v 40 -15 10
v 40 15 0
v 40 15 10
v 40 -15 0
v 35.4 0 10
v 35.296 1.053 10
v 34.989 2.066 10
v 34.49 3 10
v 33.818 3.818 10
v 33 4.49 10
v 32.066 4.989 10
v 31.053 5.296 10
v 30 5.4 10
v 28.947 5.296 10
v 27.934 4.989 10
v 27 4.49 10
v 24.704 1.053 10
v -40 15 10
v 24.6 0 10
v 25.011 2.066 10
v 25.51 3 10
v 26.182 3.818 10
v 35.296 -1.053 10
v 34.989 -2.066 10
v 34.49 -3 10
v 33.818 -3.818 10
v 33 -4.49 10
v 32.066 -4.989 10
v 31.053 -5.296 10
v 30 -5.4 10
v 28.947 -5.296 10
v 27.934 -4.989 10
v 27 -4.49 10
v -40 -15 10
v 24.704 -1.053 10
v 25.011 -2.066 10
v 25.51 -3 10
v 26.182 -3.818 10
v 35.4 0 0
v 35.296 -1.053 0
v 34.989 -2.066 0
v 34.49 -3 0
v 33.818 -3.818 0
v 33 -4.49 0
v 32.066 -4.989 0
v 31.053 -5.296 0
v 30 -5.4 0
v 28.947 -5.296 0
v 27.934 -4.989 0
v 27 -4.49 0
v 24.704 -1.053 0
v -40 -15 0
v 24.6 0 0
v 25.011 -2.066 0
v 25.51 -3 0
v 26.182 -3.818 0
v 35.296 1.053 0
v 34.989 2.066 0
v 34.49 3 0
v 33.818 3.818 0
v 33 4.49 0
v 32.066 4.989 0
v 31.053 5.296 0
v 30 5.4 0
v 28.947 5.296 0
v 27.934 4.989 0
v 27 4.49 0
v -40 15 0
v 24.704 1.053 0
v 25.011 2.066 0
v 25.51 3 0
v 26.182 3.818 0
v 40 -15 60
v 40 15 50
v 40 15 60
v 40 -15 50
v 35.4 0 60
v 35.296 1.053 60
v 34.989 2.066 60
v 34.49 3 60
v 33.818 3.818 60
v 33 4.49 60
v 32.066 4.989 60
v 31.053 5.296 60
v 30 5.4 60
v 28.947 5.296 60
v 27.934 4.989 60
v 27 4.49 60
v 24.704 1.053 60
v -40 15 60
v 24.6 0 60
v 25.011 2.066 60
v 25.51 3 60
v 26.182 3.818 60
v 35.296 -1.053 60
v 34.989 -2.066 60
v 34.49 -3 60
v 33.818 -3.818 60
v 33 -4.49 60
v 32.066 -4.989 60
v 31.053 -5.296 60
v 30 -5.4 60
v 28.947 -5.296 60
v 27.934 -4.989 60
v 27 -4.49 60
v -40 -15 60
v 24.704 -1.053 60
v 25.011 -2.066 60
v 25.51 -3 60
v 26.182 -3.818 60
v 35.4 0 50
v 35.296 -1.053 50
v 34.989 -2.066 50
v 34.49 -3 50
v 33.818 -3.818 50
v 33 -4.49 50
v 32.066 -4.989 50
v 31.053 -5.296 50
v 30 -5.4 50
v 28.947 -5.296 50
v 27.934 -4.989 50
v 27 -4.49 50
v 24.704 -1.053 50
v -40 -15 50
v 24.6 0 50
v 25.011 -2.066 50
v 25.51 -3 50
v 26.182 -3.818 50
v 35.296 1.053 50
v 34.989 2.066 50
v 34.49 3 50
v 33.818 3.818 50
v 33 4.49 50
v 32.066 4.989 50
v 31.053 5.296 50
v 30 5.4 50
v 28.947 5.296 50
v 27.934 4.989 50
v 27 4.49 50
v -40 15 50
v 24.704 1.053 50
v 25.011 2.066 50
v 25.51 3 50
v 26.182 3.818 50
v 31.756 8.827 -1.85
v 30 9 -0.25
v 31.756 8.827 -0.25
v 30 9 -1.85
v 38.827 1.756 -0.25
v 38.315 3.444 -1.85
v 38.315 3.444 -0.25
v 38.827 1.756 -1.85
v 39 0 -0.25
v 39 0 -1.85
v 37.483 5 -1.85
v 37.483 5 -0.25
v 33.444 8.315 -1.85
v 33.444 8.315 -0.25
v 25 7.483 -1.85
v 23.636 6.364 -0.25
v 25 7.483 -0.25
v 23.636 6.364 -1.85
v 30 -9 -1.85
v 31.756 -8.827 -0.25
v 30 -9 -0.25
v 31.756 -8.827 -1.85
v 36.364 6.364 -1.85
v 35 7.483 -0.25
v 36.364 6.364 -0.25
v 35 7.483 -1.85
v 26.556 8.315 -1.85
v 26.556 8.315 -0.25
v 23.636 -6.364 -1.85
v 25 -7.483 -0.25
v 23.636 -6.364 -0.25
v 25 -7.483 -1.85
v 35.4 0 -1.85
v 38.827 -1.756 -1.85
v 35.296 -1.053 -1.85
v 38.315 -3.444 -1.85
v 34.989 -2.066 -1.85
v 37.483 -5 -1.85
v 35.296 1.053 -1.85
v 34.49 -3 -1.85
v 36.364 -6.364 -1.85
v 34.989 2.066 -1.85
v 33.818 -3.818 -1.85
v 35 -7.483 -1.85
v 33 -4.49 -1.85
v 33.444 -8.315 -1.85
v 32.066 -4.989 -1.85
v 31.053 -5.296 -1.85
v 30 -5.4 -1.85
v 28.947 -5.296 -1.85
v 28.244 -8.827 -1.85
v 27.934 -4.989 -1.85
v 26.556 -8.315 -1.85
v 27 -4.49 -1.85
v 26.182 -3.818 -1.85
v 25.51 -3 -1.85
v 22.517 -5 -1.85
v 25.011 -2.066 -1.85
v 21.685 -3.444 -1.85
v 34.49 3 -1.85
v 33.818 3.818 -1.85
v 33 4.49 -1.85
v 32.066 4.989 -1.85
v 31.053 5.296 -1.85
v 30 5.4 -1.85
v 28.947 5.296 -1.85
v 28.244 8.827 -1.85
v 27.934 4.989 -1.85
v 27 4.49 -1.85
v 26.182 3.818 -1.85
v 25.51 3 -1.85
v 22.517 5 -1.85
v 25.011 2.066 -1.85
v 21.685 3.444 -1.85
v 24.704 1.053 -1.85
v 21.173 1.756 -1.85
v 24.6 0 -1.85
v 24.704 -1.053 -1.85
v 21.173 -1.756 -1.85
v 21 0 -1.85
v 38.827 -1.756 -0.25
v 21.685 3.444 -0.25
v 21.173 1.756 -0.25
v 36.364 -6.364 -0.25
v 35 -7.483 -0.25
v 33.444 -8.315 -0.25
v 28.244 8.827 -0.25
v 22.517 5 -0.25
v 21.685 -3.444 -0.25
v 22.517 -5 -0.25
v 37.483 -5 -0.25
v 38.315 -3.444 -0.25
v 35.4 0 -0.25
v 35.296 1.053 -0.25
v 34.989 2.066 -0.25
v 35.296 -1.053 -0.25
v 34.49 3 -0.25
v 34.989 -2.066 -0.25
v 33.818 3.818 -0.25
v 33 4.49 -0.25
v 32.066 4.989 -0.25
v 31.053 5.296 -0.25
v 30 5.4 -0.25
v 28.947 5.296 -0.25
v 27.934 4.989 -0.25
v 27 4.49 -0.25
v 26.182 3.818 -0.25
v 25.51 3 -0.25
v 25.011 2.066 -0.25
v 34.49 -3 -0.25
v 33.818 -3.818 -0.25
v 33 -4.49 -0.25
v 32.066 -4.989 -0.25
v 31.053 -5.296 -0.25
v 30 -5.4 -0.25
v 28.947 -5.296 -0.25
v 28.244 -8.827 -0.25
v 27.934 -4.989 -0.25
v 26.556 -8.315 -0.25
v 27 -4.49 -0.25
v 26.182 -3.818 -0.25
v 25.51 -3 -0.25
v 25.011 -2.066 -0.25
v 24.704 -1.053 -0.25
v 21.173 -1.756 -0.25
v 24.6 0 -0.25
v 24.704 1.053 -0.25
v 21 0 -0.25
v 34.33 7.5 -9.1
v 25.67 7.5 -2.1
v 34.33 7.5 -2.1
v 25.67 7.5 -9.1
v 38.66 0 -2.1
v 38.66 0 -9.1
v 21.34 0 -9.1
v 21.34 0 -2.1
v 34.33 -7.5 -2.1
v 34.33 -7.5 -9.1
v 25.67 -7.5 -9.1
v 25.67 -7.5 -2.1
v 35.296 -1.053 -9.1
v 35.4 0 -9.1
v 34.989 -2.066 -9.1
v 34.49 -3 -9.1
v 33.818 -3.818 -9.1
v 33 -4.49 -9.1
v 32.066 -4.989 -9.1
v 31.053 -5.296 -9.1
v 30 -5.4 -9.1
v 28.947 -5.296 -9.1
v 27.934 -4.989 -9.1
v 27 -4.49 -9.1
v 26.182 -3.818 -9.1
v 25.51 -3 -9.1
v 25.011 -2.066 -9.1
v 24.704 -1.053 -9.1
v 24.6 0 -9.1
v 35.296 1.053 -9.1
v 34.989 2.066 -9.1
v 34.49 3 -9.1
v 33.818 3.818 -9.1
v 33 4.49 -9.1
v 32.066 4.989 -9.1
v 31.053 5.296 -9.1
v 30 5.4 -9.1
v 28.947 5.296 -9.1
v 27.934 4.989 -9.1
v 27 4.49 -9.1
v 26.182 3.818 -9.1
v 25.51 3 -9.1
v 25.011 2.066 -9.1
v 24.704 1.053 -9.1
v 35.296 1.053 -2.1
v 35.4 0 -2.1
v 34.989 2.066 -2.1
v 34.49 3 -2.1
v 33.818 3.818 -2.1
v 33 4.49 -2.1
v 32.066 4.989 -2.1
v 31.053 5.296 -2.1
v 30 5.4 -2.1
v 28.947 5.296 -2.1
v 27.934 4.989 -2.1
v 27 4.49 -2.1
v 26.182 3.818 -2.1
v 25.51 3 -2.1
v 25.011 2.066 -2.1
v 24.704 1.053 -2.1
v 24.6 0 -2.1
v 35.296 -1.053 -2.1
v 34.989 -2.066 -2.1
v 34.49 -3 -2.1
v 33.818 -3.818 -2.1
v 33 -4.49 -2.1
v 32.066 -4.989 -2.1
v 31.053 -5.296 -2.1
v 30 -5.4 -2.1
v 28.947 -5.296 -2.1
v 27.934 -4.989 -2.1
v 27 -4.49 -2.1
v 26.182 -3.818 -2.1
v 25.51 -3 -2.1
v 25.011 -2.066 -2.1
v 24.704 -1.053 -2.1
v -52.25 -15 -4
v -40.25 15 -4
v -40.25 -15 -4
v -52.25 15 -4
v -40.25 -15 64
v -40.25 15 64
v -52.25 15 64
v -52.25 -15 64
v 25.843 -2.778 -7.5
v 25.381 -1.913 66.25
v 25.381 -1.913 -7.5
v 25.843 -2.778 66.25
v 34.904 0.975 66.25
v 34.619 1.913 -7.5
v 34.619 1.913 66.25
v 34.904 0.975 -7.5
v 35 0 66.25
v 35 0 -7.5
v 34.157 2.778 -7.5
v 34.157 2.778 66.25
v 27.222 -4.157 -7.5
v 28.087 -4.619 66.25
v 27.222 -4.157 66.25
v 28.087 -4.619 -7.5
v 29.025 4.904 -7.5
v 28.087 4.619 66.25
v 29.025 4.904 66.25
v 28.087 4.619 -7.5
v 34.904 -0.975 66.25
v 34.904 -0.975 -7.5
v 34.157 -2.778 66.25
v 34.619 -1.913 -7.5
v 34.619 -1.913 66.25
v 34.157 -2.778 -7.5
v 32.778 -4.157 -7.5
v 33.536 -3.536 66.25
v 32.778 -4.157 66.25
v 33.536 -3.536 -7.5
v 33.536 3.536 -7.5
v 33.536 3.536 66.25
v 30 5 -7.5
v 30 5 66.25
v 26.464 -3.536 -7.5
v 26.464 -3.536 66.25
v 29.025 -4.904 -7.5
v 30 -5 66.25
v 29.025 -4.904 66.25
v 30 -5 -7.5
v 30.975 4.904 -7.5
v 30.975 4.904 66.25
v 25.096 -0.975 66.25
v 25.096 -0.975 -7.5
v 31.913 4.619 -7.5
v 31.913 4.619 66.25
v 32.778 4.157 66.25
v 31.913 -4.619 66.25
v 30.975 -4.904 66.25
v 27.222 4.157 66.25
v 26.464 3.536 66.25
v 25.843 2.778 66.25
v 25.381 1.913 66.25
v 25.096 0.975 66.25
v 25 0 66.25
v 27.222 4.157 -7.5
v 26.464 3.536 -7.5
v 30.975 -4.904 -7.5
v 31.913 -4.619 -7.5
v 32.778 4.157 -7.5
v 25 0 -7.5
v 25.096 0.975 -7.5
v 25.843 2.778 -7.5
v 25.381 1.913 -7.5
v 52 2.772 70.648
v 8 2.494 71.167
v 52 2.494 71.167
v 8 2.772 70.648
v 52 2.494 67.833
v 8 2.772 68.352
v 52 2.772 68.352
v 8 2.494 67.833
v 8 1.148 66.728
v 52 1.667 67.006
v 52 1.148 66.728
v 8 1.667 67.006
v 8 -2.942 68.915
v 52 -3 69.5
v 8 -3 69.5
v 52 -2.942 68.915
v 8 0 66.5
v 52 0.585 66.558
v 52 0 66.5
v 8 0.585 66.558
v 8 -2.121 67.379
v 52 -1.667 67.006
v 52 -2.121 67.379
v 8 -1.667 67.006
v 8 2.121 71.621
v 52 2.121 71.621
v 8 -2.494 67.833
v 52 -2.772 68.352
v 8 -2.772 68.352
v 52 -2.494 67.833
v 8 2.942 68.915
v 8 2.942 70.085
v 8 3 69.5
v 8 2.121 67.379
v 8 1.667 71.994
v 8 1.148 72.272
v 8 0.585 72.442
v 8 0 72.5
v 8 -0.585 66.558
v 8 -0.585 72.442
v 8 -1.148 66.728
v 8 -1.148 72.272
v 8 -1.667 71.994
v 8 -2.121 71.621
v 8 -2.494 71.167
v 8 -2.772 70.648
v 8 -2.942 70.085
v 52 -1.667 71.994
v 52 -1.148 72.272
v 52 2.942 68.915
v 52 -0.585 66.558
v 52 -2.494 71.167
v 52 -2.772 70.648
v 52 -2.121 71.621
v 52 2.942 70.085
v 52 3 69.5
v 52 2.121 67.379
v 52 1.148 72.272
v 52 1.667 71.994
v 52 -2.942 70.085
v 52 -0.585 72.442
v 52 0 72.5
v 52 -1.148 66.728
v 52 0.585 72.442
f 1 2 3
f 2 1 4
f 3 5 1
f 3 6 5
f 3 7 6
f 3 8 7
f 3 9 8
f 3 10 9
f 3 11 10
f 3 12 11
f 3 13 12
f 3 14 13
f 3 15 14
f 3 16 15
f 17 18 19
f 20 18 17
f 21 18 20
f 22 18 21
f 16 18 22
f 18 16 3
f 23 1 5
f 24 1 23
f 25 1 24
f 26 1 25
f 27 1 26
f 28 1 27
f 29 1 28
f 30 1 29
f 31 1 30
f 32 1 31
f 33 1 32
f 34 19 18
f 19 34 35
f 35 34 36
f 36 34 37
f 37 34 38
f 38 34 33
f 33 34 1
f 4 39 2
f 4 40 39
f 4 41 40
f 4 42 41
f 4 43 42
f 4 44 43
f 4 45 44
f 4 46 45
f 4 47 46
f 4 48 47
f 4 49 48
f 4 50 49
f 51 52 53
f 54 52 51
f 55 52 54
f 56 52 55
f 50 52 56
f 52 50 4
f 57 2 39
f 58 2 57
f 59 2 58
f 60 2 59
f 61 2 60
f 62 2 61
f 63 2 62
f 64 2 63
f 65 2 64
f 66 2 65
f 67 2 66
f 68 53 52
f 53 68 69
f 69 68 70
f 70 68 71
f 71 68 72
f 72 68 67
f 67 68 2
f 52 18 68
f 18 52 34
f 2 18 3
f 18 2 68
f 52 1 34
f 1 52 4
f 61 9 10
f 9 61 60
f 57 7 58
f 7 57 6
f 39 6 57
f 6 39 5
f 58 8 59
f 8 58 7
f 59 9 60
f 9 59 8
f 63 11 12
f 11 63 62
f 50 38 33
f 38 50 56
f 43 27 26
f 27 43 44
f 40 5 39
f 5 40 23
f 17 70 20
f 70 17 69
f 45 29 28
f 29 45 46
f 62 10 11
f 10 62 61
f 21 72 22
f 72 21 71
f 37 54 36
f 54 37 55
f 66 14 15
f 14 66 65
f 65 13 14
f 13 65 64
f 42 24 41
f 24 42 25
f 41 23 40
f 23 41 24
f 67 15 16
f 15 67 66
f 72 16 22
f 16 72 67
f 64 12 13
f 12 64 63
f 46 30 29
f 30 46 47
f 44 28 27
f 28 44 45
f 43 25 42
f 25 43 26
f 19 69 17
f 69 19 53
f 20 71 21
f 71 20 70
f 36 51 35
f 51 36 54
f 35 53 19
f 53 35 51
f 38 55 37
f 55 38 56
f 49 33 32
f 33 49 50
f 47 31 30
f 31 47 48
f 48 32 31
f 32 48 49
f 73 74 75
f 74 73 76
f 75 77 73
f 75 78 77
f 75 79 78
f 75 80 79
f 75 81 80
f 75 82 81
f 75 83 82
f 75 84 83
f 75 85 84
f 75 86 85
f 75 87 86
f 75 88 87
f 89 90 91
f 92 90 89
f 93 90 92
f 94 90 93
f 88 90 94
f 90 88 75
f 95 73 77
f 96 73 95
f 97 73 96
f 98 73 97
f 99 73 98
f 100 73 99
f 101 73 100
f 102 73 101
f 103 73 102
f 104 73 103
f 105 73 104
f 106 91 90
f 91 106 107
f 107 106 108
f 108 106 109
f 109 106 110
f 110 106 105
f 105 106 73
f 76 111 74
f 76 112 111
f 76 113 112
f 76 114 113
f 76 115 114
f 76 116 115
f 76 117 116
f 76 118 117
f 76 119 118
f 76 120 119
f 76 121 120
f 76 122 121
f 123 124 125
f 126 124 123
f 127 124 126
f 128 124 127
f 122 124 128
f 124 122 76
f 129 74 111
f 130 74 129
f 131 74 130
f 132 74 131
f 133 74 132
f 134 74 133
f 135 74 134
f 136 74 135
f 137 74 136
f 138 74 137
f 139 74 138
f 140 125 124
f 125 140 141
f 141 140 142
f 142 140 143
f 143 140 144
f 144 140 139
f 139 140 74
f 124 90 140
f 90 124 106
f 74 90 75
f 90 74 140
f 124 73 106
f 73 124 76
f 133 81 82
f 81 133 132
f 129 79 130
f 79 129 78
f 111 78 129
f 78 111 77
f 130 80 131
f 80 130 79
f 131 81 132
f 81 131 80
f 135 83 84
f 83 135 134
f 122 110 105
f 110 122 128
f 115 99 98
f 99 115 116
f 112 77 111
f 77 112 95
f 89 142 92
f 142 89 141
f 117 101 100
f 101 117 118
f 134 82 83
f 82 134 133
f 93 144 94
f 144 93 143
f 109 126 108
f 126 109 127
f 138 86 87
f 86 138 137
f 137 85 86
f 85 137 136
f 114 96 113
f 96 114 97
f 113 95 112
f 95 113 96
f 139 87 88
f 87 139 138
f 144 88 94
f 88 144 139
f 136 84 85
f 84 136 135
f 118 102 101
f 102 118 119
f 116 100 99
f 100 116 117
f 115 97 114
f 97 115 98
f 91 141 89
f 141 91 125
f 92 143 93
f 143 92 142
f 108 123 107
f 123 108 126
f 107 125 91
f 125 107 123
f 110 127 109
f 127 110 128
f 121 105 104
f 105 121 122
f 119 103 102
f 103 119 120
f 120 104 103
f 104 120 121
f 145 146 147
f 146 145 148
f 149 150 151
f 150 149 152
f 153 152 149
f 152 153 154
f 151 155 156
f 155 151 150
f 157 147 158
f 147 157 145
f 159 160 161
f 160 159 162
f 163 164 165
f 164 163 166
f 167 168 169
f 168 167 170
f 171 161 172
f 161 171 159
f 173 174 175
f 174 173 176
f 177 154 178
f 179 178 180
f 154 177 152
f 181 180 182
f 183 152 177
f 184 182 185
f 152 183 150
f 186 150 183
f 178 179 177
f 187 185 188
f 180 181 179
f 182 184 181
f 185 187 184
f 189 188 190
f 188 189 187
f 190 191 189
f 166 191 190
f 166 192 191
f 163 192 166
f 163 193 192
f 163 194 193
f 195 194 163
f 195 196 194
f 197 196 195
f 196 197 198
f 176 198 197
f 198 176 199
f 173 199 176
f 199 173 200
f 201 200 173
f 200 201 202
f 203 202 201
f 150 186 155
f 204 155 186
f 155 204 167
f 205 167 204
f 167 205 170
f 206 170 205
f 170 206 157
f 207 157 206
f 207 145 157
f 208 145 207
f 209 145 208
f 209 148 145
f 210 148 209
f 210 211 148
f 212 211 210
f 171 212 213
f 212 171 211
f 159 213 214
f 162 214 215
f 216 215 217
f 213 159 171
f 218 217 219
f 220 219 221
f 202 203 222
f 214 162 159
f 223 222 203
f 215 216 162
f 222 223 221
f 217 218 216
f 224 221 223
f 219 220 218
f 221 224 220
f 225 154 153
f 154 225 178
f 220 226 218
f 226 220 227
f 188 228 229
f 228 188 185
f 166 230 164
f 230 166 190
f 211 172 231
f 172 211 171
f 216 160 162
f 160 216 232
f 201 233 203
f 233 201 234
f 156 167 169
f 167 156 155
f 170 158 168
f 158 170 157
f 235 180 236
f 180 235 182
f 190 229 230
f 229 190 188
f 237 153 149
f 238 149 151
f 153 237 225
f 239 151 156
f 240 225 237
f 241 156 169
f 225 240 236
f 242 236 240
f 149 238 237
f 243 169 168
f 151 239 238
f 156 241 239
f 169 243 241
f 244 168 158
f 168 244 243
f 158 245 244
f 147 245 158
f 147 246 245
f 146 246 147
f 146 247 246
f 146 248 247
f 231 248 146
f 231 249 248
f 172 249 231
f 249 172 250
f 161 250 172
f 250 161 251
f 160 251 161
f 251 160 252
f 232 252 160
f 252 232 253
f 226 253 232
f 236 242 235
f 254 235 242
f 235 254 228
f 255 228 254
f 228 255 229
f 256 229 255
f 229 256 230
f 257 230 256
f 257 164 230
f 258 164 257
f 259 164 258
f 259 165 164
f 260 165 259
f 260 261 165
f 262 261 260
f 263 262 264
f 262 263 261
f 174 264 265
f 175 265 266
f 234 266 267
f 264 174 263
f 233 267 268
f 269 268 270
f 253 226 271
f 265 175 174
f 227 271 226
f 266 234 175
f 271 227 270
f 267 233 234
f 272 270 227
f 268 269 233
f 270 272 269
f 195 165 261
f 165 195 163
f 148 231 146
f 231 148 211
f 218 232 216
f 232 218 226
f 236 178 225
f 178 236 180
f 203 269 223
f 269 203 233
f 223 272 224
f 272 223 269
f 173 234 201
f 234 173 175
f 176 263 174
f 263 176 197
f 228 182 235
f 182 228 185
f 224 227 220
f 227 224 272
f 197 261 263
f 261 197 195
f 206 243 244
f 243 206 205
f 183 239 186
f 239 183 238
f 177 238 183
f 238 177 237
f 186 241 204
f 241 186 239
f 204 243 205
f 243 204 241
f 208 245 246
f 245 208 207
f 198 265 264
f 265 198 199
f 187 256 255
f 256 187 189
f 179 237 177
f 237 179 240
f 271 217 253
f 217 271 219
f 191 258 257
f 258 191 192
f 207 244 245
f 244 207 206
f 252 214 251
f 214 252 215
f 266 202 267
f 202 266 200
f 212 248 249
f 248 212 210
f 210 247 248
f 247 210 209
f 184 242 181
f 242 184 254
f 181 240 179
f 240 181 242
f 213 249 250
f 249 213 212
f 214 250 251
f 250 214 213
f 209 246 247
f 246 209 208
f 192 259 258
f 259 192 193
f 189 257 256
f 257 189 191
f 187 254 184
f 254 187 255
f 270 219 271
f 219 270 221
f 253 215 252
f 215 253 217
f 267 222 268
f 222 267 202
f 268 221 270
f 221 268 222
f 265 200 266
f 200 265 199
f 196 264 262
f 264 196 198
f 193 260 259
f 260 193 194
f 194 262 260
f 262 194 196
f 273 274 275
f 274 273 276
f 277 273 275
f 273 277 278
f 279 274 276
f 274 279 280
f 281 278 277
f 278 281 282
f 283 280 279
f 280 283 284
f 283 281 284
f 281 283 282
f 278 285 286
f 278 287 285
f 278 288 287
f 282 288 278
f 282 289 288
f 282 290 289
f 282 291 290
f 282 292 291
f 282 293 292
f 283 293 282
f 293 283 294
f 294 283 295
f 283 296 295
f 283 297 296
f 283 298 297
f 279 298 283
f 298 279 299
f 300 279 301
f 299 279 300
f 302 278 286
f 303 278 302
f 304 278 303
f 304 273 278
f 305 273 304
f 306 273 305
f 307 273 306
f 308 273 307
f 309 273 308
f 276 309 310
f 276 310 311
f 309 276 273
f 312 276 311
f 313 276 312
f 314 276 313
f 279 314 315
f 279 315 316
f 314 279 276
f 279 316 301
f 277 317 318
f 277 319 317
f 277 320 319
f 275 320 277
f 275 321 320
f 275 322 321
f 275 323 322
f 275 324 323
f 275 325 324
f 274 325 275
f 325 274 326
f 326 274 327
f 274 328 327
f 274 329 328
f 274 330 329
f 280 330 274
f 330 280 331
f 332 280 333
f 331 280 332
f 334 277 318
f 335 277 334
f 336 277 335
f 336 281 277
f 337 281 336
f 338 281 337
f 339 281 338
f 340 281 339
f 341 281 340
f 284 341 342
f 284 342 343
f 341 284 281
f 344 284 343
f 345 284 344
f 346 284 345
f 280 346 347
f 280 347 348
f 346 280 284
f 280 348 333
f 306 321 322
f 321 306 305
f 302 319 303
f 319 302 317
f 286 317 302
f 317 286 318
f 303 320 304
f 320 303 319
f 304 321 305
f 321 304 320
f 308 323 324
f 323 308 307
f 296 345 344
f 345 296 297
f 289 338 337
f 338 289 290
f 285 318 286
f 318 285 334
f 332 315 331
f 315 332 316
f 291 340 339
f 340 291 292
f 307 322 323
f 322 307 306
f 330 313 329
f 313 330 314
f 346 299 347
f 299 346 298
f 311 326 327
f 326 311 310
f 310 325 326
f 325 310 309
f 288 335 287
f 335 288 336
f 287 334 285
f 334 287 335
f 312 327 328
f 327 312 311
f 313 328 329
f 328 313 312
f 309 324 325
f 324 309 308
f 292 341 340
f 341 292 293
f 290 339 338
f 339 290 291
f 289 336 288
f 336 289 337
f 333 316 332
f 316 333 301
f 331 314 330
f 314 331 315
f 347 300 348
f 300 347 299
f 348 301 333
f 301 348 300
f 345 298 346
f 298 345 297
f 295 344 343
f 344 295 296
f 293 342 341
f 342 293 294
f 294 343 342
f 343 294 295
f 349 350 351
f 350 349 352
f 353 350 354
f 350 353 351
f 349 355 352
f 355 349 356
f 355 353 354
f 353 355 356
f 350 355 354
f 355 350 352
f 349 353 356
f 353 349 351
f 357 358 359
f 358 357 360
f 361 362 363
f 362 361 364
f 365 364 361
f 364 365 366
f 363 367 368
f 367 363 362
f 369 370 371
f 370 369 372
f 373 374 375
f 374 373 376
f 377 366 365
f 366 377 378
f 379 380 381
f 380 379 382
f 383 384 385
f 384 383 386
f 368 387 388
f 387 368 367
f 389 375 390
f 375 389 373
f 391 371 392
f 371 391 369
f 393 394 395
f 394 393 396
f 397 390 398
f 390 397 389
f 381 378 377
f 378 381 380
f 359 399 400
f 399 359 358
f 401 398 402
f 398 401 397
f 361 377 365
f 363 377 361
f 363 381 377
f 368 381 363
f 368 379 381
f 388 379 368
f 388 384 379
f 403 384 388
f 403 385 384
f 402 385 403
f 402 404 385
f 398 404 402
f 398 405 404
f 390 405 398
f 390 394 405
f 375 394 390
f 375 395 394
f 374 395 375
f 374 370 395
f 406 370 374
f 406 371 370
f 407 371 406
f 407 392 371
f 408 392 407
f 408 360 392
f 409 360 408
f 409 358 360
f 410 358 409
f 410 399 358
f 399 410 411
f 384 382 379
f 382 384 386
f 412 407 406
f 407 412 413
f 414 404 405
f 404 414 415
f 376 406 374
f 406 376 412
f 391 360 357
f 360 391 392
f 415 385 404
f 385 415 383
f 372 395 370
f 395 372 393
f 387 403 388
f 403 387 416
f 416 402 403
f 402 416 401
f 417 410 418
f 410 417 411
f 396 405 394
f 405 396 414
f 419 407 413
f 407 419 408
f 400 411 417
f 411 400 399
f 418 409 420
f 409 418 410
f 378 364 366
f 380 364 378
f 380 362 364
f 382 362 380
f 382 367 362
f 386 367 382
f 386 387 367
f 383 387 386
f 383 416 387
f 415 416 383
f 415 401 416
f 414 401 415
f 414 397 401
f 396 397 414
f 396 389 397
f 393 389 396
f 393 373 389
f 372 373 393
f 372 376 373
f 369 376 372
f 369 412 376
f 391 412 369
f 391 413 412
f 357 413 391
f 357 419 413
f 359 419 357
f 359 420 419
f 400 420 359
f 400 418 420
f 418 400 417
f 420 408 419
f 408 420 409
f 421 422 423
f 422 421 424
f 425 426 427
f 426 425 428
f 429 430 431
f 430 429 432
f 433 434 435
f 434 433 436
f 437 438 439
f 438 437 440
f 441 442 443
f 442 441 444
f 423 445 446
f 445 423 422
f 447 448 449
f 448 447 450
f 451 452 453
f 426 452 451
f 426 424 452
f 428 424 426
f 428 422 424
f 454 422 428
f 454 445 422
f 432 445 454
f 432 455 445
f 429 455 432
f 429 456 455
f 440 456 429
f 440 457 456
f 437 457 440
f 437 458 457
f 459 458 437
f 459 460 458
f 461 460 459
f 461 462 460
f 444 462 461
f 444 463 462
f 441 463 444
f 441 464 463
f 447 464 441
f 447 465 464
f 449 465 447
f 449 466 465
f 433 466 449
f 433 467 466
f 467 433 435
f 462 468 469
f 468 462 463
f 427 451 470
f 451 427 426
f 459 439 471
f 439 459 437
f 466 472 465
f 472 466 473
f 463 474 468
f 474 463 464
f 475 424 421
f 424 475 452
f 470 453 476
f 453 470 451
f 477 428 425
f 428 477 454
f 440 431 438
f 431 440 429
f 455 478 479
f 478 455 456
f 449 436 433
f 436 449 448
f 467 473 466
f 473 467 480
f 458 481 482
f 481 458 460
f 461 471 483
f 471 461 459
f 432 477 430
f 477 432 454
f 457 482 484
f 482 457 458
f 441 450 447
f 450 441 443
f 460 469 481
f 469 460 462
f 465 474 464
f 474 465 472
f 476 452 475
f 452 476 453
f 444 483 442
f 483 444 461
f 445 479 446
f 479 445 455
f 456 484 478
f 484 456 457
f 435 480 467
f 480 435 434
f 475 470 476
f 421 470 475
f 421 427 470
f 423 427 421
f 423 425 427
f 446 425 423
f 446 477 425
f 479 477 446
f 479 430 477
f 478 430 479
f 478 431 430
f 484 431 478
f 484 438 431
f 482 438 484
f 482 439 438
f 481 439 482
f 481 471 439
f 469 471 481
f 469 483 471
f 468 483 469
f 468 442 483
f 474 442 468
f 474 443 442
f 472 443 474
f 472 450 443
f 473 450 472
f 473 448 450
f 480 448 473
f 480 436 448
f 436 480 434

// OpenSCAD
$fn = 32;

// ------------------------------------------------------------------------
// C clamp: throat 50 mm, screw d10
// Every part is its own module, assembly() places every instance.
// ------------------------------------------------------------------------

// --- part 1 ---
module clamp_arm() {
  difference() {
    translate([-40, -15, 0]) cube([80, 30, 10]);
    translate([30, 0, -1]) cylinder(h = 12, d = 10.8);
  }
}

// --- part 2 ---
module clamp_spine() {
  difference() {
    translate([-34, -15, 0]) cube([68, 30, 12]);
  }
}

// --- part 3 ---
module clamp_screw() {
  translate([0, 0, -36.875]) cylinder(h = 73.75, d = 10);
}

// --- part 4 ---
module clamp_washer() {
  difference() {
      translate([0, 0, 0]) cylinder(h = 1.6, d = 18);
      translate([0, 0, -1]) cylinder(h = 3.6, d = 10.8);
    }
}

// --- part 5 ---
module clamp_nut() {
  difference() {
    linear_extrude(height = 7) polygon(points = [[8.66, 0], [4.33, 7.5], [-4.33, 7.5], [-8.66, 0], [-4.33, -7.5], [4.33, -7.5]]);
    translate([0, 0, -1]) cylinder(h = 9, d = 10.8);
  }
}

// --- part 6 ---
module tommy_bar() {
  translate([0, 0, -22]) cylinder(h = 44, d = 6);
}

// --- assembly ---
module assembly() {
  color([0.80, 0.24, 0.20]) translate([0, 0, 0]) rotate([0, 0, 0]) clamp_arm();
  color([0.20, 0.45, 0.75]) translate([0, 0, 50]) rotate([0, 0, 0]) clamp_arm();
  color([0.25, 0.62, 0.32]) translate([-52.25, 0, 30]) rotate([0, 90, 0]) clamp_spine();
  color([0.92, 0.70, 0.18]) translate([30, 0, 29.375]) rotate([0, 0, 0]) clamp_screw();
  color([0.58, 0.35, 0.70]) translate([30, 0, -1.85]) rotate([0, 0, 0]) clamp_washer();
  color([0.16, 0.66, 0.66]) translate([30, 0, -9.1]) rotate([0, 0, 0]) clamp_nut();
  color([0.85, 0.48, 0.18]) translate([30, 0, 69.5]) rotate([0, 90, 0]) tommy_bar();
}

assembly();
